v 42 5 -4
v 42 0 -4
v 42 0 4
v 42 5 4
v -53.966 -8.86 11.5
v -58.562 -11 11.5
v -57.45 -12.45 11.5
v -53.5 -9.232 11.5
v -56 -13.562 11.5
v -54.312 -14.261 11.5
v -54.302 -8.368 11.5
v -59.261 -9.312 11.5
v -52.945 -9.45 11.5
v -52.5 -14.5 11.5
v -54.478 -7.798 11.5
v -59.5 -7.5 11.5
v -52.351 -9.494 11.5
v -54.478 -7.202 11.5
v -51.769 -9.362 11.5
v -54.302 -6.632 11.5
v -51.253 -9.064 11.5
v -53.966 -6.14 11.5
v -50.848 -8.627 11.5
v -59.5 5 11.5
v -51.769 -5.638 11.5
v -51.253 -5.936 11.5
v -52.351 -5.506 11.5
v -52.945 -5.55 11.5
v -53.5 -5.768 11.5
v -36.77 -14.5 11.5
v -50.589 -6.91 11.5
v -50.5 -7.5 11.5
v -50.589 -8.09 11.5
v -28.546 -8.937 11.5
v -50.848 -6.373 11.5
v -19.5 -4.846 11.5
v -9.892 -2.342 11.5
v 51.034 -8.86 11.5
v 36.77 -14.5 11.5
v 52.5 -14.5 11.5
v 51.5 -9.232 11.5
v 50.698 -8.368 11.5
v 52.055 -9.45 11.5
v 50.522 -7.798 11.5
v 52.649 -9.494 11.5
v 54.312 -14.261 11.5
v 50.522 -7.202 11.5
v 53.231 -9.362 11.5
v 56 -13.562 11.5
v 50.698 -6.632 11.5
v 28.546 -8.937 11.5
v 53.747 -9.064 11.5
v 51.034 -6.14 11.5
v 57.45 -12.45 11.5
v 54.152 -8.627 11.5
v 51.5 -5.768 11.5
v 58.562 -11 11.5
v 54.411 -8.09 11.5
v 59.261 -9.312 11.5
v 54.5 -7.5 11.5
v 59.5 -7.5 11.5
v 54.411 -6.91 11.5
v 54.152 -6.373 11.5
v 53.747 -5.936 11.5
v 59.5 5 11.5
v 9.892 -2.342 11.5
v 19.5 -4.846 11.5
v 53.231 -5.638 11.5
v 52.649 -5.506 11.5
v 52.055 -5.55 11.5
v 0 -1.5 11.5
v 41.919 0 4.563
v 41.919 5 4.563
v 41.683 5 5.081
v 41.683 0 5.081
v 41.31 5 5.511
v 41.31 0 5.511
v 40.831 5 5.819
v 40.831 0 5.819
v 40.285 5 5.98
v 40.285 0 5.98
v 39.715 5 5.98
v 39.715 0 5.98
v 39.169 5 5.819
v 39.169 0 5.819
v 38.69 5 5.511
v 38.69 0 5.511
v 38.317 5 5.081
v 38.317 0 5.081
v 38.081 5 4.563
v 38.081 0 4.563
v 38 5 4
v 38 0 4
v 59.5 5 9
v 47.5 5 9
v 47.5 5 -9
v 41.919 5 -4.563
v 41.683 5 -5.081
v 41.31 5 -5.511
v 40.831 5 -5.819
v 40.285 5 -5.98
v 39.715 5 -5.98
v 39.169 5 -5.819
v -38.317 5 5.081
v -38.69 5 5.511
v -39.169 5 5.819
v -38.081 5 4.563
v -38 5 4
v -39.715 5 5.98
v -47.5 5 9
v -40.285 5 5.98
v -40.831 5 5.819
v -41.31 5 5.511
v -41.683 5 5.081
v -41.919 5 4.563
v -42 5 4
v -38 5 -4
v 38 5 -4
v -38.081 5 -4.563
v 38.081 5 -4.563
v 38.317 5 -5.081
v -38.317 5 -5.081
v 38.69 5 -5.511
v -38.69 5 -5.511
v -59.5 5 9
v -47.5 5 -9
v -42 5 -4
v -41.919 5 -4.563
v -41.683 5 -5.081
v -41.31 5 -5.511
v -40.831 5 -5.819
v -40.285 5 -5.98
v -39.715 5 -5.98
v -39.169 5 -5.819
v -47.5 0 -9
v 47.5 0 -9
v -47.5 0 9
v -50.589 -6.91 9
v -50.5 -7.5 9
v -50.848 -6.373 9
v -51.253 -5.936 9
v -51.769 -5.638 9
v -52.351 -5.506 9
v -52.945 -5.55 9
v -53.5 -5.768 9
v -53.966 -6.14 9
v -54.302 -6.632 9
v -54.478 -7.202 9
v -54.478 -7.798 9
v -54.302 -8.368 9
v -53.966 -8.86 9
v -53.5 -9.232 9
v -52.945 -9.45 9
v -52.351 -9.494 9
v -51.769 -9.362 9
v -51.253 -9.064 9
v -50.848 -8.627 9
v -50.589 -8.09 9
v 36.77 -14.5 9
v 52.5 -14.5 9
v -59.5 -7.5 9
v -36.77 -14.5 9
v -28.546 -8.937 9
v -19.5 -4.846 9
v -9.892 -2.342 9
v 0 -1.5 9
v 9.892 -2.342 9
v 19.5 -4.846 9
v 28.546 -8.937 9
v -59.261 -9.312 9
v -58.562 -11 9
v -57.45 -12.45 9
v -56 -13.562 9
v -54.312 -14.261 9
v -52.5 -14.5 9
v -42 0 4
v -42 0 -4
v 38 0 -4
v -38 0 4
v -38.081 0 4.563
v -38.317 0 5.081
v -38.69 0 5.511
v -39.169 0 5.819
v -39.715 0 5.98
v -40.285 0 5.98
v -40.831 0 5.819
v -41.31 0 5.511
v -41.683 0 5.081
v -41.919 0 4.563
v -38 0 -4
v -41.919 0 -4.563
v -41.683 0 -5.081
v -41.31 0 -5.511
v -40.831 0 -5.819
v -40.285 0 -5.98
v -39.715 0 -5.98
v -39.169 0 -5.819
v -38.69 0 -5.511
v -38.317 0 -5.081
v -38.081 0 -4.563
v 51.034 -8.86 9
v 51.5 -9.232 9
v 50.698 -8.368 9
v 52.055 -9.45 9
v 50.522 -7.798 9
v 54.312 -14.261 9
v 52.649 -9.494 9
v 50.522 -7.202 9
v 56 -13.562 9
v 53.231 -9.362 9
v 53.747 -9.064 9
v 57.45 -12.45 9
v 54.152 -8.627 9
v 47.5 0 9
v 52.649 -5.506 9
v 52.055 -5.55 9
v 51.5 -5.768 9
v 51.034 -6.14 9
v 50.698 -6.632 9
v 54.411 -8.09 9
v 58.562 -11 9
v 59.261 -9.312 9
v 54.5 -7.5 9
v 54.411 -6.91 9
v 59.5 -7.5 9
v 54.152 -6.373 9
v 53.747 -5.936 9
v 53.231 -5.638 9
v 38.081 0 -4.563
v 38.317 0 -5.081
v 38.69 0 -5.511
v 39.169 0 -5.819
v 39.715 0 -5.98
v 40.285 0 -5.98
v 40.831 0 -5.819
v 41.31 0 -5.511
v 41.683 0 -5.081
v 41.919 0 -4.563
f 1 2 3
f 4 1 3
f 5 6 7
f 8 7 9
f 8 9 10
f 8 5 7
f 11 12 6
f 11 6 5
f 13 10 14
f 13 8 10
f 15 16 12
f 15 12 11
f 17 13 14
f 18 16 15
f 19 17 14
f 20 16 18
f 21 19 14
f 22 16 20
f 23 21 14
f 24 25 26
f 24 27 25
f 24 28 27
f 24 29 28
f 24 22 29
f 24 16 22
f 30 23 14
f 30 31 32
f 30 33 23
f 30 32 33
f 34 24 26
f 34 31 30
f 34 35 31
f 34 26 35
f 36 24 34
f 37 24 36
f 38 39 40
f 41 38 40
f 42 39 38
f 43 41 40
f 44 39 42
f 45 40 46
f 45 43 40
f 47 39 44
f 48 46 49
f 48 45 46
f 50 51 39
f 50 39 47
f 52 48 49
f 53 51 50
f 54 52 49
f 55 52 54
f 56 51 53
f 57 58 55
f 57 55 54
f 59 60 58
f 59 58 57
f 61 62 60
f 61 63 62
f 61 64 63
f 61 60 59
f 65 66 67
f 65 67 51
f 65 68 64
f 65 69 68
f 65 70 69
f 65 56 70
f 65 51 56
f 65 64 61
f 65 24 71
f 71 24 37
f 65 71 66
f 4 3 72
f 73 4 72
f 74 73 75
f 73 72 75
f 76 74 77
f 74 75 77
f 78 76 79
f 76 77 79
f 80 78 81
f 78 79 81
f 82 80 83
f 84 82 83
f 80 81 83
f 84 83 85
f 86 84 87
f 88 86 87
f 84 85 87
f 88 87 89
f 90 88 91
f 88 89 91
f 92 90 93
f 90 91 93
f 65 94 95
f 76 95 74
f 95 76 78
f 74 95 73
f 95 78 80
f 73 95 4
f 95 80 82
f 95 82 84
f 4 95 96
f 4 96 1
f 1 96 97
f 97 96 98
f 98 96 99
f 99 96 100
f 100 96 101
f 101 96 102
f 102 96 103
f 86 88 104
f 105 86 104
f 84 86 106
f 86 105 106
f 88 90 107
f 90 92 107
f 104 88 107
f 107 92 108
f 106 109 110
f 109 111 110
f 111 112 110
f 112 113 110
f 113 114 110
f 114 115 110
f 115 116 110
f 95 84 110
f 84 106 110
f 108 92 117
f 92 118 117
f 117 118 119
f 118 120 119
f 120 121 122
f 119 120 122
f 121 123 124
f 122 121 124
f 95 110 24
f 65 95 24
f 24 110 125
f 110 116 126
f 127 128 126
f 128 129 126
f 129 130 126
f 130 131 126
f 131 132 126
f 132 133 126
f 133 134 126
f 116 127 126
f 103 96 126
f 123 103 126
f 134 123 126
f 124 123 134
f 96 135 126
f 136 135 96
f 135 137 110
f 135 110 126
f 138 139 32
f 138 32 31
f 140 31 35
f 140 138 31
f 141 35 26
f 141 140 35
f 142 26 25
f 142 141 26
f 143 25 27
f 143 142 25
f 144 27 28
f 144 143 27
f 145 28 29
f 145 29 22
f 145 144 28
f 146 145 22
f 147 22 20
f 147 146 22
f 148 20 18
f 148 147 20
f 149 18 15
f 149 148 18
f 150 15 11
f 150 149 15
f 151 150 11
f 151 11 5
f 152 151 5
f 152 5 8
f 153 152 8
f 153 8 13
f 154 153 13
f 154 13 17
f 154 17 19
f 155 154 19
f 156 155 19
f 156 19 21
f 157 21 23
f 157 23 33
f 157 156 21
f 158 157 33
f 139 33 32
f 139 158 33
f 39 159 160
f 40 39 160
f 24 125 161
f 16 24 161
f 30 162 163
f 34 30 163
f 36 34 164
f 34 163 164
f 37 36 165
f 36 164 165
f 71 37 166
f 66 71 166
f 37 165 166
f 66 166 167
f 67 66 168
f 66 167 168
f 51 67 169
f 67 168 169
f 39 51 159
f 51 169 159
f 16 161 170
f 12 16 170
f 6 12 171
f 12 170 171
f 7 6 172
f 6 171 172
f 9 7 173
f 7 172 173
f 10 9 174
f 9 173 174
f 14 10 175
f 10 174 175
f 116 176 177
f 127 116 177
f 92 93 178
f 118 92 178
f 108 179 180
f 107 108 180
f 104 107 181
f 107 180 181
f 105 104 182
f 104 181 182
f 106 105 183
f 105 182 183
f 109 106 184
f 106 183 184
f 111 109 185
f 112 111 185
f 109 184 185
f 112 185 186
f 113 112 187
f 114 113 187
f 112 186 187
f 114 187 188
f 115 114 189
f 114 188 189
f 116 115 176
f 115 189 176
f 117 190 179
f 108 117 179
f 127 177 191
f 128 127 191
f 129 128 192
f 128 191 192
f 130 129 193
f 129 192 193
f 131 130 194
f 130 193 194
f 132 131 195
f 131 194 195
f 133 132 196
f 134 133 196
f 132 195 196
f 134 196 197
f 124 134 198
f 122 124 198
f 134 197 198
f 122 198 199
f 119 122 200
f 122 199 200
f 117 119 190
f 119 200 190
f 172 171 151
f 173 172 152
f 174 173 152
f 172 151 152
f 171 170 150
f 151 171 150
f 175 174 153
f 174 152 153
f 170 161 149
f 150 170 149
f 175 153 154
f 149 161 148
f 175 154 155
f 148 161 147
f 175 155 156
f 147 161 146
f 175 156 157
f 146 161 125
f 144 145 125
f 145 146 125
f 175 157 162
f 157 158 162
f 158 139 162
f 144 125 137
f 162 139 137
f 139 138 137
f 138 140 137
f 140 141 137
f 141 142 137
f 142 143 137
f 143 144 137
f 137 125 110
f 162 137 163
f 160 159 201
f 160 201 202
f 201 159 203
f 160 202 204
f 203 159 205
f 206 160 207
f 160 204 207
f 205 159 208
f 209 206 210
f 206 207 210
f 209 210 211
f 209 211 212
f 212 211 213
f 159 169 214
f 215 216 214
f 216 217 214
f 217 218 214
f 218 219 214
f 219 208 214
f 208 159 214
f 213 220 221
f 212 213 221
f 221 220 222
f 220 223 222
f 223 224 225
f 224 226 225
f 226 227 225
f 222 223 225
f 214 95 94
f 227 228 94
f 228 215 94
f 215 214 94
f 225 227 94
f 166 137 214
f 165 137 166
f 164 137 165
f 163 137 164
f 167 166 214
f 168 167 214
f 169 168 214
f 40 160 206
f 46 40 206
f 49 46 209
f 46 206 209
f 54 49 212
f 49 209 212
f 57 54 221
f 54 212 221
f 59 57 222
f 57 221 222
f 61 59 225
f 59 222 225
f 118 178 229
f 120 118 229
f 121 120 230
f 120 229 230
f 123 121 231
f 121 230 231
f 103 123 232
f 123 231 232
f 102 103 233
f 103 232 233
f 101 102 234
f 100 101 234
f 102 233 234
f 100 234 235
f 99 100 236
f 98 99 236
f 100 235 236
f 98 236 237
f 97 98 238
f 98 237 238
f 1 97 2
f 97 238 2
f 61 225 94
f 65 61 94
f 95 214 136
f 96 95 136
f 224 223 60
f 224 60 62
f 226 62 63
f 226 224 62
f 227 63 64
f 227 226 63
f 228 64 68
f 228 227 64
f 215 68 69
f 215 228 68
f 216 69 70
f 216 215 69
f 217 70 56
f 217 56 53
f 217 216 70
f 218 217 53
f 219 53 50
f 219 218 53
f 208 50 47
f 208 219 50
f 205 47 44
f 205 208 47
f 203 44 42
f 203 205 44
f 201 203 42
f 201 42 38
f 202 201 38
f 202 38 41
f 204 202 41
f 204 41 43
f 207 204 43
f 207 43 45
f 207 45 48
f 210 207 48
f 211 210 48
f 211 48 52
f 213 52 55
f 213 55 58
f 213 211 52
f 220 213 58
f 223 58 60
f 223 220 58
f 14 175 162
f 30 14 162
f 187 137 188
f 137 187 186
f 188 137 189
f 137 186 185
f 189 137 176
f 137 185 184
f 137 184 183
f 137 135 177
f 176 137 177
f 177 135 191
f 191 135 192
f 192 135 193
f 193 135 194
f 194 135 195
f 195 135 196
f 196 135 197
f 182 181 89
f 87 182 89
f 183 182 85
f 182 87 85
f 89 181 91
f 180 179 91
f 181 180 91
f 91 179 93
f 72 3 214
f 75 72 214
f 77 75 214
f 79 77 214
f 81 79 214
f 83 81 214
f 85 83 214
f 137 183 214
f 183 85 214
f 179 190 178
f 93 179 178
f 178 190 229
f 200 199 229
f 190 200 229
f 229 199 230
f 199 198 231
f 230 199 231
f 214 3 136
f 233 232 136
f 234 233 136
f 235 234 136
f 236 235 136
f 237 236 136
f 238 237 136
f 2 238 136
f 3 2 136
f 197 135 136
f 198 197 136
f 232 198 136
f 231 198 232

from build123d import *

# Parameters (mm, degrees)
SKETCH1_W           = 95
SKETCH1_H           = 18
BOSS_EXTRUDE1_DEPTH = 5
SKETCH2_R           = 2
SKETCH2_W           = 95
SKETCH2_H           = 5
BOSS_EXTRUDE2_DEPTH = 2.5


with BuildPart() as part:
    # Sketch1 → Boss-Extrude1 (new body)
    with BuildSketch(Plane(origin=(0, 0, 0), x_dir=(1, 0, 0), z_dir=(0, 1, 0))):
        Rectangle(SKETCH1_W, SKETCH1_H)
        with BuildLine():
            Line((-38, 4), (-38, -4))
            ThreePointArc((-38, -4), (-40, -6), (-42, -4))
            Line((-42, -4), (-42, 4))
            ThreePointArc((-42, 4), (-40, 6), (-38, 4))
        make_face(mode=Mode.SUBTRACT)
        with BuildLine():
            Line((42, 4), (42, -4))
            ThreePointArc((42, -4), (40, -6), (38, -4))
            Line((38, -4), (38, 4))
            ThreePointArc((38, 4), (40, 6), (42, 4))
        make_face(mode=Mode.SUBTRACT)
    extrude(amount=BOSS_EXTRUDE1_DEPTH)

    # Sketch2 → Boss-Extrude2 (add)
    # profile 1 of 2: a face of its own
    with BuildSketch(Plane.XY.offset(9)):
        with BuildLine():
            Line((-52.5, -14.5), (-36.769552622, -14.5))
            ThreePointArc((-36.769552622, -14.5), (0, -1.5), (36.769552622, -14.5))
            Line((36.769552622, -14.5), (52.5, -14.5))
            ThreePointArc((52.5, -14.5), (57.449747468, -12.449747468), (59.5, -7.5))
            Line((59.5, -7.5), (59.5, 5))
            Line((59.5, 5), (47.5, 5))
            Line((47.5, 5), (47.5, 0))
            Line((47.5, 0), (-47.5, 0))
            Line((-47.5, 0), (-47.5, 5))
            Line((-47.5, 5), (-59.5, 5))
            Line((-59.5, 5), (-59.5, -7.5))
            ThreePointArc((-59.5, -7.5), (-57.449747468, -12.449747468), (-52.5, -14.5))
        make_face()
        with Locations((-52.5, -7.5)):
            Circle(SKETCH2_R, mode=Mode.SUBTRACT)
        with Locations((52.5, -7.5)):
            Circle(SKETCH2_R, mode=Mode.SUBTRACT)
    # profile 2 of 2: a face of its own
    with BuildSketch(Plane.XY.offset(9)):
        with Locations((0, 2.5)):
            Rectangle(SKETCH2_W, SKETCH2_H)
    extrude(amount=BOSS_EXTRUDE2_DEPTH)


solid = part.part
